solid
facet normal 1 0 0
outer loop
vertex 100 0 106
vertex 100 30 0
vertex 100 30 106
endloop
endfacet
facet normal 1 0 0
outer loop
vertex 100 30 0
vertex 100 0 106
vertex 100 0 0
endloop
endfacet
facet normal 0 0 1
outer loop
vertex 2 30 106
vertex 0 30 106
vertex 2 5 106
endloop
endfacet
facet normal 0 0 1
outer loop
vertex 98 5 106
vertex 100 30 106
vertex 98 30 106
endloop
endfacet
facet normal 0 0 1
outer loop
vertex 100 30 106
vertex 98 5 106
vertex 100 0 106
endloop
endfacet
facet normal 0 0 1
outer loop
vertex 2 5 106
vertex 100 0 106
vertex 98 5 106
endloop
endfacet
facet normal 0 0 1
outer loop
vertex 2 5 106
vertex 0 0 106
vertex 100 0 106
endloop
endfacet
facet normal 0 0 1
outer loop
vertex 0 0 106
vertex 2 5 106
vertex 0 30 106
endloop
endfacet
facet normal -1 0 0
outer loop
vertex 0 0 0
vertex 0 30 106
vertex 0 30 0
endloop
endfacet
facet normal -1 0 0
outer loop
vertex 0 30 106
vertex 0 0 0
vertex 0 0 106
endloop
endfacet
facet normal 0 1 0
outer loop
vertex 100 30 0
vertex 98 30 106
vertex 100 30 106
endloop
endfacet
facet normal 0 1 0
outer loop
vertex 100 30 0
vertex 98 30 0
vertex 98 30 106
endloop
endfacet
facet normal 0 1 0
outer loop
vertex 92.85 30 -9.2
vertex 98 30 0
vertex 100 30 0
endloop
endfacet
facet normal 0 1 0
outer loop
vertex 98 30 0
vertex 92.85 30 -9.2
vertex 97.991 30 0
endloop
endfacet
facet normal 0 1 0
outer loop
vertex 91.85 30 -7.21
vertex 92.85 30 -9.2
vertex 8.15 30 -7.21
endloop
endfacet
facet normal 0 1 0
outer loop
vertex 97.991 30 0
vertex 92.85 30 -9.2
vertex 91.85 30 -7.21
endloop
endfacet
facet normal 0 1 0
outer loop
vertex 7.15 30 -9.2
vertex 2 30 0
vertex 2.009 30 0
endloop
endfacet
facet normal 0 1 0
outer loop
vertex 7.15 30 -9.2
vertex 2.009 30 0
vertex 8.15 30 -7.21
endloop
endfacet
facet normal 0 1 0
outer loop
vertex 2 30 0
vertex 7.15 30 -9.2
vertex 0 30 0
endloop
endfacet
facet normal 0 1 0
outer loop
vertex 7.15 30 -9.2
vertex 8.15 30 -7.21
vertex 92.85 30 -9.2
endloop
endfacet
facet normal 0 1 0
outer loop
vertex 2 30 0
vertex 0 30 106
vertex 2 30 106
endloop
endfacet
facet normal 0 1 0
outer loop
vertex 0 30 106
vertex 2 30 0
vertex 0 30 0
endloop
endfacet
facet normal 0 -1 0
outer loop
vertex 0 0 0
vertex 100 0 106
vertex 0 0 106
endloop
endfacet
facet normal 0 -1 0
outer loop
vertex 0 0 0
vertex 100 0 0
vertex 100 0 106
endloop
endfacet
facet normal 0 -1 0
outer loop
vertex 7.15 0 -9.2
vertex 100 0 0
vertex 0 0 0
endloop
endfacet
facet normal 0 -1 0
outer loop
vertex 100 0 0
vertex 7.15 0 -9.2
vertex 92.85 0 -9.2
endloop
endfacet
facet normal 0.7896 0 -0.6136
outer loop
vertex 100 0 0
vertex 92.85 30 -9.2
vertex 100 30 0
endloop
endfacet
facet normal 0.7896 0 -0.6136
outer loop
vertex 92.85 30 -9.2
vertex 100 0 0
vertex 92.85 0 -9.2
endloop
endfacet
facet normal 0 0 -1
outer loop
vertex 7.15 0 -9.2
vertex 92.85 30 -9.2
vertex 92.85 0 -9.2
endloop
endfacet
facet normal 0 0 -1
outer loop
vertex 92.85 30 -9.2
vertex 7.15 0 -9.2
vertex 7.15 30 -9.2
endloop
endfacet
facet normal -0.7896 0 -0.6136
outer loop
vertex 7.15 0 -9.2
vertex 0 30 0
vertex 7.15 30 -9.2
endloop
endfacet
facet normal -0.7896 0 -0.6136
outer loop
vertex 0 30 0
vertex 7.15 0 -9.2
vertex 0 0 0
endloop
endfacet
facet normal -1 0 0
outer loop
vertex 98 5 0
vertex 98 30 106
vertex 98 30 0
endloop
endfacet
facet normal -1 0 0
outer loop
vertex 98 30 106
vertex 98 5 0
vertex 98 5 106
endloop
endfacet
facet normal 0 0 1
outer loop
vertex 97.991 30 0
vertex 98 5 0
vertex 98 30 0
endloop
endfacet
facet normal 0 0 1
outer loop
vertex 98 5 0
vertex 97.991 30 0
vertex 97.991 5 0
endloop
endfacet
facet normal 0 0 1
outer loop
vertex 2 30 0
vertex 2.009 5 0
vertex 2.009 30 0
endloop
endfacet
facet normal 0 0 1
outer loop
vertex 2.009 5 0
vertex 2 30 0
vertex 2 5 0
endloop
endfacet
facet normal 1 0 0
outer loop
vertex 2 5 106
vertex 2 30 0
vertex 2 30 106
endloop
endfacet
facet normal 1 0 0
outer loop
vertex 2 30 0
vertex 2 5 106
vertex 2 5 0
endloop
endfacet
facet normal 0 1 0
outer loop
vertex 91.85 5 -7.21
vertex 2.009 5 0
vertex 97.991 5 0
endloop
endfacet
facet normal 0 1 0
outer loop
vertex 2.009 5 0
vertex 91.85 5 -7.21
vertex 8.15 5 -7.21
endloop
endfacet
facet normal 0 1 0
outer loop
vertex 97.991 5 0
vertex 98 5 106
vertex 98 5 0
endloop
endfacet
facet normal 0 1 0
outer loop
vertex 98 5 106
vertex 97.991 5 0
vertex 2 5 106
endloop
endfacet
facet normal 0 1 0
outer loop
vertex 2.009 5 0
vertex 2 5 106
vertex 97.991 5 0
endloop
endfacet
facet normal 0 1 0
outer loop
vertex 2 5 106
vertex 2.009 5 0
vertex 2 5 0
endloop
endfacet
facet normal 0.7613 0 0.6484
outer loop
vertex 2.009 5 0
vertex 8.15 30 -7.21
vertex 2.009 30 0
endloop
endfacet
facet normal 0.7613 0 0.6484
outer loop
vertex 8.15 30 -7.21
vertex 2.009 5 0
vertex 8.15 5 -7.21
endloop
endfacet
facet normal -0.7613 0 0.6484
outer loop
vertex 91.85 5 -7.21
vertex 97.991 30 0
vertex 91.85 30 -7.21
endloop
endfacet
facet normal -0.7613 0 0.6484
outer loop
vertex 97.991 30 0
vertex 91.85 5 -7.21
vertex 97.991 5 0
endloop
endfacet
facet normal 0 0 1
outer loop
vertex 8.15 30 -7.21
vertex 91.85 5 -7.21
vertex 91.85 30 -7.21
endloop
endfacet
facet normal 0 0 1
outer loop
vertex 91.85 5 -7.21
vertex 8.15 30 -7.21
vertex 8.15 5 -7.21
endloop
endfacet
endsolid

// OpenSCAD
// ankle back box
// measures are in mm
// copied and adapted from the blueprints of CS:R from R2 Builders Club

h = 2; // thickness of box
c = 0.01; // cut over edge

module prism(lb, wb, lt, wt, h) {
  ld = (lb - lt) / 2;
  wd = (wb - wt) / 2;

  points = [
    [0, 0, 0], // 0
    [lb, 0, 0], // 1
    [lb, wb, 0], // 2
    [0, wb, 0], // 3
    [ld, wd, h], // 4
    [lb-ld, wd, h], // 5
    [lb-ld, wb-wd, h], // 6
    [ld, wb-wd, h], // 7
    ];

  faces = [
    [0, 1, 2, 3], // bottom
    [0, 4, 5, 1], // front
    [7, 6, 5, 4], // top
    [1, 5, 6, 2], // right
    [2, 6, 7, 3], // back
    [3, 7, 4, 0], // left
    ];

  polyhedron(points, faces);
}

// outer dimensions of box
module outer() {
  cube(size=[100, 30, 106]);

  mirror([0,0,1])
    prism(100, 30, 85.7, 30, 9.2);
}

// inner dimensions of box
module inner() {
  translate([h, 5, 0])
    cube(size=[100-h*2, 25 + c, 106 + c]);

  translate([h, 5, c])
    mirror([0,0,1])
    prism(100-h*2, 25 + c, 85.7-h, 25 + c, 9.2-h + 2*c);
}

module all() {
  difference() {
    outer();
    inner();
  }
}

all();
